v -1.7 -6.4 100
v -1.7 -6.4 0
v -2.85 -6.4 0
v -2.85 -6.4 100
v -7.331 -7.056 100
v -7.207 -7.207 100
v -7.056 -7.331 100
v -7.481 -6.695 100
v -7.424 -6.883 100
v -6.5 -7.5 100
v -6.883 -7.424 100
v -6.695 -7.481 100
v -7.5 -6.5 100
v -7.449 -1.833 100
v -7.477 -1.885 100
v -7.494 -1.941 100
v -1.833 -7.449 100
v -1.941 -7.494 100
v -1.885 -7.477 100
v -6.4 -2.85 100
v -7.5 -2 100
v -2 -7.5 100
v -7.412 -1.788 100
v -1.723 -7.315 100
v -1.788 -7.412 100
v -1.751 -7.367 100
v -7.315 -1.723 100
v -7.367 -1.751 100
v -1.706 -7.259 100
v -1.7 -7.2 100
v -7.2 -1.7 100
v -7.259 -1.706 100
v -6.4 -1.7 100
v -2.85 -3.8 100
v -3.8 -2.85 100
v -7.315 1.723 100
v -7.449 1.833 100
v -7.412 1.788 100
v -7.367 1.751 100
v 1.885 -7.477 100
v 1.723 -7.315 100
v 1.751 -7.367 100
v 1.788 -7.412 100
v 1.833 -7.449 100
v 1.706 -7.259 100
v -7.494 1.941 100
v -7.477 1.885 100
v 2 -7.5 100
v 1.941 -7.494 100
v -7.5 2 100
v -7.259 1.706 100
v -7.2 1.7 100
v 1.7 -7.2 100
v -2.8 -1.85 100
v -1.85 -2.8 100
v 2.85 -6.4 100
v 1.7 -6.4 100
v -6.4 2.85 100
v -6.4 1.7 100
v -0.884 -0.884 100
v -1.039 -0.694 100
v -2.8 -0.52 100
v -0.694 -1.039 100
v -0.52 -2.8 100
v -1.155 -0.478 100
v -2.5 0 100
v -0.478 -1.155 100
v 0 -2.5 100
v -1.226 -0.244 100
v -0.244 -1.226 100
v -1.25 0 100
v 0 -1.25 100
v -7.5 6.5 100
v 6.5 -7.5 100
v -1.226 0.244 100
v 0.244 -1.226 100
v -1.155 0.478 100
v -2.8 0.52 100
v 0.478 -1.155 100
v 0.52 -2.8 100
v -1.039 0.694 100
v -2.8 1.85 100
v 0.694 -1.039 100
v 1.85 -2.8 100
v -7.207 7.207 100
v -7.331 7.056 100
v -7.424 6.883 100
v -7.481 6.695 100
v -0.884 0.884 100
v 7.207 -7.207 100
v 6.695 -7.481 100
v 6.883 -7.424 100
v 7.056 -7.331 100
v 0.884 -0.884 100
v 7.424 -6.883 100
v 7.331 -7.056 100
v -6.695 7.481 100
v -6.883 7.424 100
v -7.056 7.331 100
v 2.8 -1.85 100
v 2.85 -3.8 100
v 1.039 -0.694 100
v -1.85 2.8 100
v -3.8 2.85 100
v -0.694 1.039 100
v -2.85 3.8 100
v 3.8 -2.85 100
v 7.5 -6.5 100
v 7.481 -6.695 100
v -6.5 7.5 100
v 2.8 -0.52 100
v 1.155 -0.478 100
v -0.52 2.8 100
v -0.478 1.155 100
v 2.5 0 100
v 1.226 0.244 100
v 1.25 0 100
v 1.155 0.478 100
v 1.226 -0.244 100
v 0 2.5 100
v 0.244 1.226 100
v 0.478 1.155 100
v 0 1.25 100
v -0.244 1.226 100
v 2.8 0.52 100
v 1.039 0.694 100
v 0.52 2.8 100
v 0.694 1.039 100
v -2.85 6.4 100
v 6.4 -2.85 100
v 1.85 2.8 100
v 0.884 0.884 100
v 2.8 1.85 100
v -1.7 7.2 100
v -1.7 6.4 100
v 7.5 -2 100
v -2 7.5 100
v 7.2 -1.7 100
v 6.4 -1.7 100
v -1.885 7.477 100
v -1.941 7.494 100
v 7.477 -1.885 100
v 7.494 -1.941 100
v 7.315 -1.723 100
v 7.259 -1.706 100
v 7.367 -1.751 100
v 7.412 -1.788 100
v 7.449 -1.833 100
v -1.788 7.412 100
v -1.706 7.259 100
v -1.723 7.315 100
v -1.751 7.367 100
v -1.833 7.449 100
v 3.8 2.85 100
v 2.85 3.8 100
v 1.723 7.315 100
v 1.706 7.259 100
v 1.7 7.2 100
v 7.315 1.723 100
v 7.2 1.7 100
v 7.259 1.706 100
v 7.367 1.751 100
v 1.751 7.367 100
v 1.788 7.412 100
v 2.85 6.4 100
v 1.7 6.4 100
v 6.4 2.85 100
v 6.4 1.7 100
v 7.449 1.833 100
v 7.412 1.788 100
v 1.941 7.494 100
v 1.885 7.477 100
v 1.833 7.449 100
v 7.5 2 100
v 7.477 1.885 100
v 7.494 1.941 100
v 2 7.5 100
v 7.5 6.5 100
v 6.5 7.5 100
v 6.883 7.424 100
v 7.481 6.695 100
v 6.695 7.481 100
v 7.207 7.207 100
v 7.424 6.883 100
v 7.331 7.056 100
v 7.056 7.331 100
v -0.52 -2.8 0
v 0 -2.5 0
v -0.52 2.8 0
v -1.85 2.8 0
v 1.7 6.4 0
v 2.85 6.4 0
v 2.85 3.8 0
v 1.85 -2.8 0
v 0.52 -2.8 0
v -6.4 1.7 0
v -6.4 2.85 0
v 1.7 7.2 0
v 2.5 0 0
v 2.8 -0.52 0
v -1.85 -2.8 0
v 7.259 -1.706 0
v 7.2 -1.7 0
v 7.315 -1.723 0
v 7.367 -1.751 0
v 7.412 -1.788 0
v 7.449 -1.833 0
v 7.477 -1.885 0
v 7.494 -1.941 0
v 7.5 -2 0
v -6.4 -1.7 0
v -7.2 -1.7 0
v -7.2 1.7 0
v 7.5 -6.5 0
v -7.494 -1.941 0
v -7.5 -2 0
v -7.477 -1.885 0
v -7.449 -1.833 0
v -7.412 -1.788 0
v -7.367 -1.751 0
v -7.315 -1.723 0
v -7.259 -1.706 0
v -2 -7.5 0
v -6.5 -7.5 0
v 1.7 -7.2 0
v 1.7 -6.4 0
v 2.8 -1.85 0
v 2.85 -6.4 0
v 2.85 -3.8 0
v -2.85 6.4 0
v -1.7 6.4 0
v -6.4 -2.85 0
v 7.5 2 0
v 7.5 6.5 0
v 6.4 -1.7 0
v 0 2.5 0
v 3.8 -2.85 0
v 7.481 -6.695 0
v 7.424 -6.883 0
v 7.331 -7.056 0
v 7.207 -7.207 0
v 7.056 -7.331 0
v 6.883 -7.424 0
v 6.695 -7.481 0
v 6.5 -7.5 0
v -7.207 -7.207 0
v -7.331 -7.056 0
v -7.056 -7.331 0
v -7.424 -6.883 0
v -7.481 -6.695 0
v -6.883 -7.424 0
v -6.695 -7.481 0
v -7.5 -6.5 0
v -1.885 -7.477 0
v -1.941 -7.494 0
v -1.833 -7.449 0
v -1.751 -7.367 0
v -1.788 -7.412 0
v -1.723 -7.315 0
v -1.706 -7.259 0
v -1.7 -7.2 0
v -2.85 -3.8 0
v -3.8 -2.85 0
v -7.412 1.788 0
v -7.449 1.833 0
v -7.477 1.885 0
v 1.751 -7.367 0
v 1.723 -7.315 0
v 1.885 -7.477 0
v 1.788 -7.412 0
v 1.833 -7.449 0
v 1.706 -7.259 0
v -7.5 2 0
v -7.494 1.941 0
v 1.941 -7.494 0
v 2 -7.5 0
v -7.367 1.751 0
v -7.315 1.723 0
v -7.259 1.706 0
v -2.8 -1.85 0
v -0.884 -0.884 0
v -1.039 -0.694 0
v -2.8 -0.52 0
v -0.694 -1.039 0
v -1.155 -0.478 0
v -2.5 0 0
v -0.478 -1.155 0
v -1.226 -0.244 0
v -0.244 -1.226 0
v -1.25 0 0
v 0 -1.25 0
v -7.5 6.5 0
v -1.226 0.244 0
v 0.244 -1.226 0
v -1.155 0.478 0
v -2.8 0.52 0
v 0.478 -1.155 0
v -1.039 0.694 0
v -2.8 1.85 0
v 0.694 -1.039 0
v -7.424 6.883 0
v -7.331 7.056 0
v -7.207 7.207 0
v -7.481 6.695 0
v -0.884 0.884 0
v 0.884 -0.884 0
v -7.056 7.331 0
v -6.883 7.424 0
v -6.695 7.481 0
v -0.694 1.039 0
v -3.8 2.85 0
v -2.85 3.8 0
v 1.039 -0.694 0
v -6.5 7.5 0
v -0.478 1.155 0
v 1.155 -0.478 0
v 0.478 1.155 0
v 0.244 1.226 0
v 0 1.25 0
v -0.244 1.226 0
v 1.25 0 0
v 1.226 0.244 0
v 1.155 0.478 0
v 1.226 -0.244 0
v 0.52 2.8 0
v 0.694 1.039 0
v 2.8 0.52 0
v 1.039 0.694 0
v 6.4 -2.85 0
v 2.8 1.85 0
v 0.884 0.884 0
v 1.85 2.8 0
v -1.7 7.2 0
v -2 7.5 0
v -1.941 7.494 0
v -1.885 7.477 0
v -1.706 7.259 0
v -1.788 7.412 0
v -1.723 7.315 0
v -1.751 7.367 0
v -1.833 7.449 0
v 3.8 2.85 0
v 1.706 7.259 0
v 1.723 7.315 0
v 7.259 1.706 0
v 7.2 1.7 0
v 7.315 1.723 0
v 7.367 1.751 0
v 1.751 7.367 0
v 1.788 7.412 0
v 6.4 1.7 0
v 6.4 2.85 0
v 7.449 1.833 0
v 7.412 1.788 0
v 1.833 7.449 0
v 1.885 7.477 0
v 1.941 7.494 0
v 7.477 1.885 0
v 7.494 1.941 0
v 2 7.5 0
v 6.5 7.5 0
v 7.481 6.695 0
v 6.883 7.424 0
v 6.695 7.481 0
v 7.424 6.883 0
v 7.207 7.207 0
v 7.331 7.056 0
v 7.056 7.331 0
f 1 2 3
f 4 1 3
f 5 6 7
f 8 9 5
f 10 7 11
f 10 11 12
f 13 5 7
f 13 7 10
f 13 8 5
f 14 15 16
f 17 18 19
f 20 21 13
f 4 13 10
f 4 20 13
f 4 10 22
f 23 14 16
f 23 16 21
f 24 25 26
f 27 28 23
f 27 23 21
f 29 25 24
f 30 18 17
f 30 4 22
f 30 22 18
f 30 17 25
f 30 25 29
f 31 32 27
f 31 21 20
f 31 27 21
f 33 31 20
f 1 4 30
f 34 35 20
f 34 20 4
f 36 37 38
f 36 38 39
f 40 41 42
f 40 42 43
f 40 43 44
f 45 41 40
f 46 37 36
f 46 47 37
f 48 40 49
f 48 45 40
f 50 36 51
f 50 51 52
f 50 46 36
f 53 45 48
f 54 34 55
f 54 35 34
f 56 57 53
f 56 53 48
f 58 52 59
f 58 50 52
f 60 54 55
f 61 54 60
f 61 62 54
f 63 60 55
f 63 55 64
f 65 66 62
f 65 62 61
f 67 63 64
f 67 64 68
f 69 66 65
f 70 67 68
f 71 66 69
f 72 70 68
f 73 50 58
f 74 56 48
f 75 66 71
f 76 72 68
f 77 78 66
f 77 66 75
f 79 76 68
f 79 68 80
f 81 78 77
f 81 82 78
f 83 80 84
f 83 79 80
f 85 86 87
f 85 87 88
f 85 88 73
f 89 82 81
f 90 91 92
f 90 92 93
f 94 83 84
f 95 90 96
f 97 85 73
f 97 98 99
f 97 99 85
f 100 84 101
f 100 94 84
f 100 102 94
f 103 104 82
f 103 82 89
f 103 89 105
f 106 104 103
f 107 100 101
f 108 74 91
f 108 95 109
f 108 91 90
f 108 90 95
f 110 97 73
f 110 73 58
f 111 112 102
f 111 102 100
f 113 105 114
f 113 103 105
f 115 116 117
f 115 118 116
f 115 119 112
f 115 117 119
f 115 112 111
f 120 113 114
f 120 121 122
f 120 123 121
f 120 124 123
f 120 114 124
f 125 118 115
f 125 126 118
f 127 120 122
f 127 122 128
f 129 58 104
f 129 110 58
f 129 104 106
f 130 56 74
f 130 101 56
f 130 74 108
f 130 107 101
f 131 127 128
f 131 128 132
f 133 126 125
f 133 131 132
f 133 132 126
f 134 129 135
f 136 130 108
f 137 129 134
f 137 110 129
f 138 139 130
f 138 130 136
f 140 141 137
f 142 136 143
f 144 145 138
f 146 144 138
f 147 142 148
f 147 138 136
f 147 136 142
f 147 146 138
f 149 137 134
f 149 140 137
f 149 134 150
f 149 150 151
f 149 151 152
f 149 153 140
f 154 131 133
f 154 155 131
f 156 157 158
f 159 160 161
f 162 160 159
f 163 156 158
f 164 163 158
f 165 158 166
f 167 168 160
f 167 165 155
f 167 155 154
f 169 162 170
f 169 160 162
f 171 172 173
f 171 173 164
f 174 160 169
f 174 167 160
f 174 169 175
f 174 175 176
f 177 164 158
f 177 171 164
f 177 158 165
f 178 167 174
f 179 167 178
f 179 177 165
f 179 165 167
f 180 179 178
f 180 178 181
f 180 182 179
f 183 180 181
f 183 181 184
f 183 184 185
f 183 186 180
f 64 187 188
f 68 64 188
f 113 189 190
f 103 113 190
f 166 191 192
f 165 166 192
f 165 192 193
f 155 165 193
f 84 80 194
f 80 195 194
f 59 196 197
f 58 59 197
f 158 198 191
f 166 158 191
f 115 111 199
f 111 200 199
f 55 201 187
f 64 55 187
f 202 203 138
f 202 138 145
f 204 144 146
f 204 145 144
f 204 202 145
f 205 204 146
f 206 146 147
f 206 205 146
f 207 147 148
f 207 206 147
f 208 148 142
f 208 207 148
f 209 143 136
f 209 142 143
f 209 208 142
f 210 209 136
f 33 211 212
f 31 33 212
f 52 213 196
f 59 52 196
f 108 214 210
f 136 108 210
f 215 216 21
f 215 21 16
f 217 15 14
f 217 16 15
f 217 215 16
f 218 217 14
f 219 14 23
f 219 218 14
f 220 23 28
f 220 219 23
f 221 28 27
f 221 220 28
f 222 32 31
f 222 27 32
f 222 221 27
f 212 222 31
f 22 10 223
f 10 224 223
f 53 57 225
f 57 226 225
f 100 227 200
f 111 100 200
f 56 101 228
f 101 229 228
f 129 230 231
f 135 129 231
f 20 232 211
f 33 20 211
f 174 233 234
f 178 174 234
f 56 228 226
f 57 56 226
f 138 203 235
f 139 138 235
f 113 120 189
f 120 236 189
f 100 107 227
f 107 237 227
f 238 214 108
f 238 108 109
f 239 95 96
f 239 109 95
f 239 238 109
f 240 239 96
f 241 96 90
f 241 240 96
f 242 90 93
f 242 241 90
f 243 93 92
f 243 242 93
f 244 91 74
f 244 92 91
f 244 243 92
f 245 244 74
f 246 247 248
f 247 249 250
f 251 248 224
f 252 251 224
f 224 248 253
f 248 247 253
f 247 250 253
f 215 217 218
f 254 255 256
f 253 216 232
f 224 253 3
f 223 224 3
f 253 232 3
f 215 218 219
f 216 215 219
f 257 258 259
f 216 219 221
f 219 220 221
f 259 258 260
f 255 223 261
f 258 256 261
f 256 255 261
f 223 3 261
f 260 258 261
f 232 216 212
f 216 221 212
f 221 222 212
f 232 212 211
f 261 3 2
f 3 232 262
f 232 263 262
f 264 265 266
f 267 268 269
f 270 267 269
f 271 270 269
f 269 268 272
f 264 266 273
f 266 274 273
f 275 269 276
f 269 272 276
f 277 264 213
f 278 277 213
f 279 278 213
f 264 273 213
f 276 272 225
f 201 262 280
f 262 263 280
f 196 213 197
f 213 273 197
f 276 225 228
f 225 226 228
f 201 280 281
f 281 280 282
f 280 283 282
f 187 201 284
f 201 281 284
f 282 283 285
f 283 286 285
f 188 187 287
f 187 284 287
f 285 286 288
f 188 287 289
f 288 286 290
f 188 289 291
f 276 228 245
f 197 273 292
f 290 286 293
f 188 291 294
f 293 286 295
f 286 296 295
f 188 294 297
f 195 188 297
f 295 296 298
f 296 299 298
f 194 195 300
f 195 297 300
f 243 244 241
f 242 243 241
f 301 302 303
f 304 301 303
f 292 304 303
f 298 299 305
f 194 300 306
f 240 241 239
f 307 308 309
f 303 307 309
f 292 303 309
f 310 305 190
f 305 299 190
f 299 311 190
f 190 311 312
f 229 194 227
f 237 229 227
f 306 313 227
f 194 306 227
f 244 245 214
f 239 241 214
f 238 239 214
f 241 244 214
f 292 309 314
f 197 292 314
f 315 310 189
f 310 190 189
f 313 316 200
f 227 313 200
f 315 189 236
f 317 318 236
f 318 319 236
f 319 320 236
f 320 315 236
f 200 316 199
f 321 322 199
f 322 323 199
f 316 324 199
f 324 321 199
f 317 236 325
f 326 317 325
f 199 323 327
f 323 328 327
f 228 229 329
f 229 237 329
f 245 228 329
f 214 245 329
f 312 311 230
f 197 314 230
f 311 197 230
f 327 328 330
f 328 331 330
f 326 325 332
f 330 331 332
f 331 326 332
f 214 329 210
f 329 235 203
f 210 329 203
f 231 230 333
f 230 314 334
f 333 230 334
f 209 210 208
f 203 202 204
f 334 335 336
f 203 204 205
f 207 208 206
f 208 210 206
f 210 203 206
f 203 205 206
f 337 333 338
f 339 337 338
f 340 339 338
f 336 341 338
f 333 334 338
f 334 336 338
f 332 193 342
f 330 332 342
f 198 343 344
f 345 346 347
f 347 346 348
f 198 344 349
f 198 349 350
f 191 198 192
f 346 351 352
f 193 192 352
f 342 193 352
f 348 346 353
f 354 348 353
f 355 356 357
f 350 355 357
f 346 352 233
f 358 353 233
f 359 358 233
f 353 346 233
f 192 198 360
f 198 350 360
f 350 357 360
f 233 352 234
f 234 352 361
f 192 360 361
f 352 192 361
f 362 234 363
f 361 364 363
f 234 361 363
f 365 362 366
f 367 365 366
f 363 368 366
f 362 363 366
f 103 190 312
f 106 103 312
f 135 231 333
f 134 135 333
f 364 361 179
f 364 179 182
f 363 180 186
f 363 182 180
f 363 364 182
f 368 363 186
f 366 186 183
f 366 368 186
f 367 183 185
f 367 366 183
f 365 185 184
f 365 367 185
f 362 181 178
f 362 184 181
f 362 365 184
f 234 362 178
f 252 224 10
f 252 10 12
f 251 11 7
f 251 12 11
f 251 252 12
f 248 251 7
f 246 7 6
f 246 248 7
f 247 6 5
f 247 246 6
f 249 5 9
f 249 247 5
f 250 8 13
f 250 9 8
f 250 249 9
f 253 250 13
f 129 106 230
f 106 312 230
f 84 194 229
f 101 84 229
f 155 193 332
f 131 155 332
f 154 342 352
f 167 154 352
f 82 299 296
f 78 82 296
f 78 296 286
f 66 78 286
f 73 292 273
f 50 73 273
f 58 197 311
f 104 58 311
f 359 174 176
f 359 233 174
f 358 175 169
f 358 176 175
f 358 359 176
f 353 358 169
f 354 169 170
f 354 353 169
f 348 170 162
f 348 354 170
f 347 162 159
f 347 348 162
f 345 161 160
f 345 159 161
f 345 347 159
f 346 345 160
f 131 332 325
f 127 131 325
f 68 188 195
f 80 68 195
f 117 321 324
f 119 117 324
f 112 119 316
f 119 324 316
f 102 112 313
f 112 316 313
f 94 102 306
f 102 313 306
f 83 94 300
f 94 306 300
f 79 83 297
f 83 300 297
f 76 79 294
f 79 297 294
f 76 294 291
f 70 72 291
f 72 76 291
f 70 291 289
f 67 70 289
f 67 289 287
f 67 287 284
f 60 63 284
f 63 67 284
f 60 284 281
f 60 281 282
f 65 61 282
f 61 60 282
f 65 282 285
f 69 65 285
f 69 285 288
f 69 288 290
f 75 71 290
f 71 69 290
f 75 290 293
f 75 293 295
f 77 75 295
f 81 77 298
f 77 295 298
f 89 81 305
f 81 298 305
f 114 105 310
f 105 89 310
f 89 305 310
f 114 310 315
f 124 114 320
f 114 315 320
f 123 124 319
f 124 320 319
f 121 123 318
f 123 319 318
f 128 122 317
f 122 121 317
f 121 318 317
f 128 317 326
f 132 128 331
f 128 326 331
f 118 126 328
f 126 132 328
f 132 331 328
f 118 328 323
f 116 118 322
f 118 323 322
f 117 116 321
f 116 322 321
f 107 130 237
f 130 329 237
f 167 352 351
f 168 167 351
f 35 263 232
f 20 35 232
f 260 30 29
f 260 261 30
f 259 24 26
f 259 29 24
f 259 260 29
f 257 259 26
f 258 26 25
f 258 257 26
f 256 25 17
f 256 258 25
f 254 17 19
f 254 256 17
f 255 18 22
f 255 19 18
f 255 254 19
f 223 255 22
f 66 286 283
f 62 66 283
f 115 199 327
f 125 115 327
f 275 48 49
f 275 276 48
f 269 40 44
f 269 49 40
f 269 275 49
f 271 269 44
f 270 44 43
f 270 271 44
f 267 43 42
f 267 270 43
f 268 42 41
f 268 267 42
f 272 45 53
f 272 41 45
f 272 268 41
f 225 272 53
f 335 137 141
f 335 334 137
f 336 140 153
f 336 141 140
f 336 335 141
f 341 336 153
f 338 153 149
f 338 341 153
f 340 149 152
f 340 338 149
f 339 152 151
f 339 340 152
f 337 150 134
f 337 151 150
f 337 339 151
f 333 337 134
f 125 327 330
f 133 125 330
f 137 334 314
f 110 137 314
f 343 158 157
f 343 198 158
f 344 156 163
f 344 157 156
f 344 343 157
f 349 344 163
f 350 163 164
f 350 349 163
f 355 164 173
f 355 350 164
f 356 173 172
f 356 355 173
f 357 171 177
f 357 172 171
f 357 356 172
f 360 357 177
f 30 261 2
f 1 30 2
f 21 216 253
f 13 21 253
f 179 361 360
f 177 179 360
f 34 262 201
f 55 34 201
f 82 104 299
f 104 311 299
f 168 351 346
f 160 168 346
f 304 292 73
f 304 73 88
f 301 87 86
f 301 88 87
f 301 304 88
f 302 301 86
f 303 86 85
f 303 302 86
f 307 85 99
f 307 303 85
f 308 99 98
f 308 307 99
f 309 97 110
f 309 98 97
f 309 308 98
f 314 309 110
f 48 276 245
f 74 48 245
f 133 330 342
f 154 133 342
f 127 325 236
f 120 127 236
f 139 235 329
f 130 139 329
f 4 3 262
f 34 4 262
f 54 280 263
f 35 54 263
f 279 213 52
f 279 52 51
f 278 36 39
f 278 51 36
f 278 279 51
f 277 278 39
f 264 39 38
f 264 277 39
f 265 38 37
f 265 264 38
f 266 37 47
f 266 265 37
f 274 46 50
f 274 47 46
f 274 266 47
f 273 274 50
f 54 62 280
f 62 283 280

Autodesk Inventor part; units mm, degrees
ref_plane "YZ Plane" through (0, 0, 0) normal (1, 0, 0) x (0, 1, 0)
ref_plane "XZ Plane" through (0, 0, 0) normal (0, 1, 0) x (-1, 0, 0)
ref_plane "XY Plane" through (0, 0, 0) normal (0, 0, 1) x (1, 0, 0)
sketch "Sketch_1" plane through (0, 0, 0) normal (0, 0, 1) x (1, 0, 0)
  arc A0 (-7.5, 2) -> (-7.2, 1.7) centre (-7.2, 2) ccw
  line L0 (-7.2, 1.7) -> (-6.4, 1.7)
  line L1 (-6.4, 1.7) -> (-6.4, 2.85)
  line L2 (-6.4, 2.85) -> (-3.8, 2.85)
  line L3 (-3.8, 2.85) -> (-2.8, 1.85)
  line L4 (-2.8, 1.85) -> (-2.8, 0.5196)
  line L5 (-2.8, 0.5196) -> (-2.5, 0)
  line L6 (-2.5, 0) -> (-2.8, -0.5196)
  line L7 (-2.8, -0.5196) -> (-2.8, -1.85)
  line L8 (-2.8, -1.85) -> (-3.8, -2.85)
  line L9 (-3.8, -2.85) -> (-6.4, -2.85)
  line L10 (-6.4, -2.85) -> (-6.4, -1.7)
  line L11 (-6.4, -1.7) -> (-7.2, -1.7)
  arc A1 (-7.2, -1.7) -> (-7.5, -2) centre (-7.2, -2) ccw
  line L12 (-7.5, -2) -> (-7.5, -6.5)
  arc A2 (-7.5, -6.5) -> (-6.5, -7.5) centre (-6.5, -6.5) ccw
  line L13 (-6.5, -7.5) -> (-2, -7.5)
  arc A3 (-2, -7.5) -> (-1.7, -7.2) centre (-2, -7.2) ccw
  line L14 (-1.7, -7.2) -> (-1.7, -6.4)
  line L15 (-1.7, -6.4) -> (-2.85, -6.4)
  line L16 (-2.85, -6.4) -> (-2.85, -3.8)
  line L17 (-2.85, -3.8) -> (-1.85, -2.8)
  line L18 (-1.85, -2.8) -> (-0.5196, -2.8)
  line L19 (-0.5196, -2.8) -> (0, -2.5)
  line L20 (0, -2.5) -> (0.5196, -2.8)
  line L21 (0.5196, -2.8) -> (1.85, -2.8)
  line L22 (1.85, -2.8) -> (2.85, -3.8)
  line L23 (2.85, -3.8) -> (2.85, -6.4)
  line L24 (2.85, -6.4) -> (1.7, -6.4)
  line L25 (1.7, -6.4) -> (1.7, -7.2)
  arc A4 (1.7, -7.2) -> (2, -7.5) centre (2, -7.2) ccw
  line L26 (2, -7.5) -> (6.5, -7.5)
  arc A5 (6.5, -7.5) -> (7.5, -6.5) centre (6.5, -6.5) ccw
  line L27 (7.5, -6.5) -> (7.5, -2)
  arc A6 (7.5, -2) -> (7.2, -1.7) centre (7.2, -2) ccw
  line L28 (7.2, -1.7) -> (6.4, -1.7)
  line L29 (6.4, -1.7) -> (6.4, -2.85)
  line L30 (6.4, -2.85) -> (3.8, -2.85)
  line L31 (3.8, -2.85) -> (2.8, -1.85)
  line L32 (2.8, -1.85) -> (2.8, -0.5196)
  line L33 (2.8, -0.5196) -> (2.5, 0)
  line L34 (2.5, 0) -> (2.8, 0.5196)
  line L35 (2.8, 0.5196) -> (2.8, 1.85)
  line L36 (2.8, 1.85) -> (3.8, 2.85)
  line L37 (3.8, 2.85) -> (6.4, 2.85)
  line L38 (6.4, 2.85) -> (6.4, 1.7)
  line L39 (6.4, 1.7) -> (7.2, 1.7)
  arc A7 (7.2, 1.7) -> (7.5, 2) centre (7.2, 2) ccw
  line L40 (7.5, 2) -> (7.5, 6.5)
  arc A8 (7.5, 6.5) -> (6.5, 7.5) centre (6.5, 6.5) ccw
  line L41 (6.5, 7.5) -> (2, 7.5)
  arc A9 (2, 7.5) -> (1.7, 7.2) centre (2, 7.2) ccw
  line L42 (1.7, 7.2) -> (1.7, 6.4)
  line L43 (1.7, 6.4) -> (2.85, 6.4)
  line L44 (2.85, 6.4) -> (2.85, 3.8)
  line L45 (2.85, 3.8) -> (1.85, 2.8)
  line L46 (1.85, 2.8) -> (0.5196, 2.8)
  line L47 (0.5196, 2.8) -> (0, 2.5)
  line L48 (0, 2.5) -> (-0.5196, 2.8)
  line L49 (-0.5196, 2.8) -> (-1.85, 2.8)
  line L50 (-1.85, 2.8) -> (-2.85, 3.8)
  line L51 (-2.85, 3.8) -> (-2.85, 6.4)
  line L52 (-2.85, 6.4) -> (-1.7, 6.4)
  line L53 (-1.7, 6.4) -> (-1.7, 7.2)
  arc A10 (-1.7, 7.2) -> (-2, 7.5) centre (-2, 7.2) ccw
  line L54 (-2, 7.5) -> (-6.5, 7.5)
  arc A11 (-6.5, 7.5) -> (-7.5, 6.5) centre (-6.5, 6.5) ccw
  line L55 (-7.5, 6.5) -> (-7.5, 2)
  circle A12 centre (0, 0) radius 1.25
extrude "Extrusion1" add sketch "Sketch_1" along normal blind 100
equation "\"d0\" = L"
equation "\"L\" = 100"
properties part number "HFS3-1515-100"
